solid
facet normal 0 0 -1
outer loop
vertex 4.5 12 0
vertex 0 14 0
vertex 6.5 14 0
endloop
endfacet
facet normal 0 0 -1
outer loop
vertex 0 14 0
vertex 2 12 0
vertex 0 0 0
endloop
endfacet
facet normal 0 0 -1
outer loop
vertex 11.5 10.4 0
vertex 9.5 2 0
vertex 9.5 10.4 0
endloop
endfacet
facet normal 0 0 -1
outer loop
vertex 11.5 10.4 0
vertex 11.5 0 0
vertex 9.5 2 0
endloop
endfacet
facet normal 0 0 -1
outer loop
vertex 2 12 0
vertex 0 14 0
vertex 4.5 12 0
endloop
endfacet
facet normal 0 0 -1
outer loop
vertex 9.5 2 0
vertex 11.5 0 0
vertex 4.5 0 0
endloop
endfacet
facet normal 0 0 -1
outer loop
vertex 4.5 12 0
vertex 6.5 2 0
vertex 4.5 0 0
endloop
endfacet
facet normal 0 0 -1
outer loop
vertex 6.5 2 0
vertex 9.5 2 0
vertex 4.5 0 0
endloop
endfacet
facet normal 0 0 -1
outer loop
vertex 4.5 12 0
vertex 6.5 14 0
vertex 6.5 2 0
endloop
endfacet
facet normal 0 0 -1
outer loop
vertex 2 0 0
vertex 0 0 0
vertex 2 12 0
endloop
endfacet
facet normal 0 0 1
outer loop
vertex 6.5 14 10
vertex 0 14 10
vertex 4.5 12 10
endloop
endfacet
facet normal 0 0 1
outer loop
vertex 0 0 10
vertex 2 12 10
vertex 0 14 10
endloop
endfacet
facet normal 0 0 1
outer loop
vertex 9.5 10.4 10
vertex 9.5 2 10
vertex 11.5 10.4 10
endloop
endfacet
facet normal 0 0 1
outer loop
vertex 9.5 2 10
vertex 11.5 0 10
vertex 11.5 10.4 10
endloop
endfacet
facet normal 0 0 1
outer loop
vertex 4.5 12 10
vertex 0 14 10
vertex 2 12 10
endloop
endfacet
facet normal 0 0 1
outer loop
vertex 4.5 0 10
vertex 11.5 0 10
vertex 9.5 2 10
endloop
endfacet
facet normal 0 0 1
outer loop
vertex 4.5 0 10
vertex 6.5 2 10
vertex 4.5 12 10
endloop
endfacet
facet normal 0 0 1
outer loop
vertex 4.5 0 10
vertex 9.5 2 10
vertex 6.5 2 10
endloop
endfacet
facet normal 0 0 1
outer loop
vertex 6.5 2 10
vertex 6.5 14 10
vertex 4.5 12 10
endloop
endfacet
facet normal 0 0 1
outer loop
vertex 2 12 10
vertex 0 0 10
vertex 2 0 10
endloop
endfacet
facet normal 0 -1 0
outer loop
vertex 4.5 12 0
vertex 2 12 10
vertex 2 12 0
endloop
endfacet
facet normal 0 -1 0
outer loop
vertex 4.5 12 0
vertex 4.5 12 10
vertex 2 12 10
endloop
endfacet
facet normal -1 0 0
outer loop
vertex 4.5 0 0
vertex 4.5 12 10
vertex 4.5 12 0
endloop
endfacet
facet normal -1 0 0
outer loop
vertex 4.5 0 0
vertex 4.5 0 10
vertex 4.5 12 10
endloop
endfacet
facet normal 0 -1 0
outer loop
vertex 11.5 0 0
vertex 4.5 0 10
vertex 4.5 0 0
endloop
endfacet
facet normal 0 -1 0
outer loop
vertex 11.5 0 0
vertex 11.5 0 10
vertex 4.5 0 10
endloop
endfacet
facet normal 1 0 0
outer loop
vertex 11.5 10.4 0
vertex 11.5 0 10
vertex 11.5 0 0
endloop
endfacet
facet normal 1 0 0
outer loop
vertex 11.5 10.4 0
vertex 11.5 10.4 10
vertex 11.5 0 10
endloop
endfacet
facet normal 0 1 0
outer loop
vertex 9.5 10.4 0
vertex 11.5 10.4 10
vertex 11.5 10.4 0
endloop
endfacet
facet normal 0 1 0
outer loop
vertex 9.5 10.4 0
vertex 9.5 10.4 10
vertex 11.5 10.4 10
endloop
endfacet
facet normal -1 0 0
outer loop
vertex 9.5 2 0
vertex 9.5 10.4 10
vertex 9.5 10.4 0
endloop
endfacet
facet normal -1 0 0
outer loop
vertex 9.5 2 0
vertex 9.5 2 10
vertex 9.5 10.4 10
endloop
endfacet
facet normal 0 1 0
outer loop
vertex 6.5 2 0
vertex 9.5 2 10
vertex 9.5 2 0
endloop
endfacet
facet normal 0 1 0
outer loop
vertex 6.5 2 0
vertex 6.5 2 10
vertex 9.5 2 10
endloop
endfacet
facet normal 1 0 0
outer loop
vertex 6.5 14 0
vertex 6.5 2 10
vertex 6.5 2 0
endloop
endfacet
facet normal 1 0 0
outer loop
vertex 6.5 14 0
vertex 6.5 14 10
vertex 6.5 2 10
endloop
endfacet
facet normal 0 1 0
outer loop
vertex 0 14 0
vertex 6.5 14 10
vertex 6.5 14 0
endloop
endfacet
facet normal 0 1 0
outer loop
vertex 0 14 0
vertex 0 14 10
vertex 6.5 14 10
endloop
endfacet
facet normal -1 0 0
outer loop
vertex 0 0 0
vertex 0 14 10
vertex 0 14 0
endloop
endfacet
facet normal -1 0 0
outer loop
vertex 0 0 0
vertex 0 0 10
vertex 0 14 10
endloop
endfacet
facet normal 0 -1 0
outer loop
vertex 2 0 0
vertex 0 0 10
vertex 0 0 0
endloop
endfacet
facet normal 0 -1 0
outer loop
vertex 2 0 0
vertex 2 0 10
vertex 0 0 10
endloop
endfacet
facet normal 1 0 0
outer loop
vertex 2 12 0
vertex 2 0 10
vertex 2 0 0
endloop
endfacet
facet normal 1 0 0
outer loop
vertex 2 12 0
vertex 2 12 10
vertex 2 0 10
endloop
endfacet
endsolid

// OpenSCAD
// file: config/led-hook-config.scad
strip_width = 12;
strip_height = 3;

clip_width = 10;

clip_thickness = 2;

box_wall_thickness = 2.5;
box_gap = 0.5;
box_inner_wall_thickness = 2;
box_inner_wall_inset = 4;
box_right_gap_drop = 8;

strip_width_fraction = 0.7;
strip_front_width = strip_width * strip_width_fraction;

double_wall_width = box_wall_thickness * 2 + box_gap + box_inner_wall_thickness;
// main file
include <./config/led-hook-config.scad>

linear_extrude(clip_width) {
  // ######  ##
  // ######  ##
  // ##  ##  ##
  // ##  ######
  // ##  ######
  polygon([
    // starting bottomg left and headed clockwise
    [0, 0],
    [0, strip_width + clip_thickness],
    [clip_thickness + box_wall_thickness + clip_thickness, strip_width + clip_thickness],
    [clip_thickness + box_wall_thickness + clip_thickness, clip_thickness],
    [clip_thickness + box_wall_thickness + clip_thickness + strip_height, clip_thickness],
    [clip_thickness + box_wall_thickness + clip_thickness + strip_height, strip_width * strip_width_fraction + clip_thickness],
    [clip_thickness + box_wall_thickness + clip_thickness + strip_height + clip_thickness, strip_width * strip_width_fraction + clip_thickness],
    [clip_thickness + box_wall_thickness + clip_thickness + strip_height + clip_thickness, 0],
    [clip_thickness + box_wall_thickness, 0],
    [clip_thickness + box_wall_thickness, strip_width],
    [clip_thickness, strip_width],
    [clip_thickness, 0],
  ]);
}
